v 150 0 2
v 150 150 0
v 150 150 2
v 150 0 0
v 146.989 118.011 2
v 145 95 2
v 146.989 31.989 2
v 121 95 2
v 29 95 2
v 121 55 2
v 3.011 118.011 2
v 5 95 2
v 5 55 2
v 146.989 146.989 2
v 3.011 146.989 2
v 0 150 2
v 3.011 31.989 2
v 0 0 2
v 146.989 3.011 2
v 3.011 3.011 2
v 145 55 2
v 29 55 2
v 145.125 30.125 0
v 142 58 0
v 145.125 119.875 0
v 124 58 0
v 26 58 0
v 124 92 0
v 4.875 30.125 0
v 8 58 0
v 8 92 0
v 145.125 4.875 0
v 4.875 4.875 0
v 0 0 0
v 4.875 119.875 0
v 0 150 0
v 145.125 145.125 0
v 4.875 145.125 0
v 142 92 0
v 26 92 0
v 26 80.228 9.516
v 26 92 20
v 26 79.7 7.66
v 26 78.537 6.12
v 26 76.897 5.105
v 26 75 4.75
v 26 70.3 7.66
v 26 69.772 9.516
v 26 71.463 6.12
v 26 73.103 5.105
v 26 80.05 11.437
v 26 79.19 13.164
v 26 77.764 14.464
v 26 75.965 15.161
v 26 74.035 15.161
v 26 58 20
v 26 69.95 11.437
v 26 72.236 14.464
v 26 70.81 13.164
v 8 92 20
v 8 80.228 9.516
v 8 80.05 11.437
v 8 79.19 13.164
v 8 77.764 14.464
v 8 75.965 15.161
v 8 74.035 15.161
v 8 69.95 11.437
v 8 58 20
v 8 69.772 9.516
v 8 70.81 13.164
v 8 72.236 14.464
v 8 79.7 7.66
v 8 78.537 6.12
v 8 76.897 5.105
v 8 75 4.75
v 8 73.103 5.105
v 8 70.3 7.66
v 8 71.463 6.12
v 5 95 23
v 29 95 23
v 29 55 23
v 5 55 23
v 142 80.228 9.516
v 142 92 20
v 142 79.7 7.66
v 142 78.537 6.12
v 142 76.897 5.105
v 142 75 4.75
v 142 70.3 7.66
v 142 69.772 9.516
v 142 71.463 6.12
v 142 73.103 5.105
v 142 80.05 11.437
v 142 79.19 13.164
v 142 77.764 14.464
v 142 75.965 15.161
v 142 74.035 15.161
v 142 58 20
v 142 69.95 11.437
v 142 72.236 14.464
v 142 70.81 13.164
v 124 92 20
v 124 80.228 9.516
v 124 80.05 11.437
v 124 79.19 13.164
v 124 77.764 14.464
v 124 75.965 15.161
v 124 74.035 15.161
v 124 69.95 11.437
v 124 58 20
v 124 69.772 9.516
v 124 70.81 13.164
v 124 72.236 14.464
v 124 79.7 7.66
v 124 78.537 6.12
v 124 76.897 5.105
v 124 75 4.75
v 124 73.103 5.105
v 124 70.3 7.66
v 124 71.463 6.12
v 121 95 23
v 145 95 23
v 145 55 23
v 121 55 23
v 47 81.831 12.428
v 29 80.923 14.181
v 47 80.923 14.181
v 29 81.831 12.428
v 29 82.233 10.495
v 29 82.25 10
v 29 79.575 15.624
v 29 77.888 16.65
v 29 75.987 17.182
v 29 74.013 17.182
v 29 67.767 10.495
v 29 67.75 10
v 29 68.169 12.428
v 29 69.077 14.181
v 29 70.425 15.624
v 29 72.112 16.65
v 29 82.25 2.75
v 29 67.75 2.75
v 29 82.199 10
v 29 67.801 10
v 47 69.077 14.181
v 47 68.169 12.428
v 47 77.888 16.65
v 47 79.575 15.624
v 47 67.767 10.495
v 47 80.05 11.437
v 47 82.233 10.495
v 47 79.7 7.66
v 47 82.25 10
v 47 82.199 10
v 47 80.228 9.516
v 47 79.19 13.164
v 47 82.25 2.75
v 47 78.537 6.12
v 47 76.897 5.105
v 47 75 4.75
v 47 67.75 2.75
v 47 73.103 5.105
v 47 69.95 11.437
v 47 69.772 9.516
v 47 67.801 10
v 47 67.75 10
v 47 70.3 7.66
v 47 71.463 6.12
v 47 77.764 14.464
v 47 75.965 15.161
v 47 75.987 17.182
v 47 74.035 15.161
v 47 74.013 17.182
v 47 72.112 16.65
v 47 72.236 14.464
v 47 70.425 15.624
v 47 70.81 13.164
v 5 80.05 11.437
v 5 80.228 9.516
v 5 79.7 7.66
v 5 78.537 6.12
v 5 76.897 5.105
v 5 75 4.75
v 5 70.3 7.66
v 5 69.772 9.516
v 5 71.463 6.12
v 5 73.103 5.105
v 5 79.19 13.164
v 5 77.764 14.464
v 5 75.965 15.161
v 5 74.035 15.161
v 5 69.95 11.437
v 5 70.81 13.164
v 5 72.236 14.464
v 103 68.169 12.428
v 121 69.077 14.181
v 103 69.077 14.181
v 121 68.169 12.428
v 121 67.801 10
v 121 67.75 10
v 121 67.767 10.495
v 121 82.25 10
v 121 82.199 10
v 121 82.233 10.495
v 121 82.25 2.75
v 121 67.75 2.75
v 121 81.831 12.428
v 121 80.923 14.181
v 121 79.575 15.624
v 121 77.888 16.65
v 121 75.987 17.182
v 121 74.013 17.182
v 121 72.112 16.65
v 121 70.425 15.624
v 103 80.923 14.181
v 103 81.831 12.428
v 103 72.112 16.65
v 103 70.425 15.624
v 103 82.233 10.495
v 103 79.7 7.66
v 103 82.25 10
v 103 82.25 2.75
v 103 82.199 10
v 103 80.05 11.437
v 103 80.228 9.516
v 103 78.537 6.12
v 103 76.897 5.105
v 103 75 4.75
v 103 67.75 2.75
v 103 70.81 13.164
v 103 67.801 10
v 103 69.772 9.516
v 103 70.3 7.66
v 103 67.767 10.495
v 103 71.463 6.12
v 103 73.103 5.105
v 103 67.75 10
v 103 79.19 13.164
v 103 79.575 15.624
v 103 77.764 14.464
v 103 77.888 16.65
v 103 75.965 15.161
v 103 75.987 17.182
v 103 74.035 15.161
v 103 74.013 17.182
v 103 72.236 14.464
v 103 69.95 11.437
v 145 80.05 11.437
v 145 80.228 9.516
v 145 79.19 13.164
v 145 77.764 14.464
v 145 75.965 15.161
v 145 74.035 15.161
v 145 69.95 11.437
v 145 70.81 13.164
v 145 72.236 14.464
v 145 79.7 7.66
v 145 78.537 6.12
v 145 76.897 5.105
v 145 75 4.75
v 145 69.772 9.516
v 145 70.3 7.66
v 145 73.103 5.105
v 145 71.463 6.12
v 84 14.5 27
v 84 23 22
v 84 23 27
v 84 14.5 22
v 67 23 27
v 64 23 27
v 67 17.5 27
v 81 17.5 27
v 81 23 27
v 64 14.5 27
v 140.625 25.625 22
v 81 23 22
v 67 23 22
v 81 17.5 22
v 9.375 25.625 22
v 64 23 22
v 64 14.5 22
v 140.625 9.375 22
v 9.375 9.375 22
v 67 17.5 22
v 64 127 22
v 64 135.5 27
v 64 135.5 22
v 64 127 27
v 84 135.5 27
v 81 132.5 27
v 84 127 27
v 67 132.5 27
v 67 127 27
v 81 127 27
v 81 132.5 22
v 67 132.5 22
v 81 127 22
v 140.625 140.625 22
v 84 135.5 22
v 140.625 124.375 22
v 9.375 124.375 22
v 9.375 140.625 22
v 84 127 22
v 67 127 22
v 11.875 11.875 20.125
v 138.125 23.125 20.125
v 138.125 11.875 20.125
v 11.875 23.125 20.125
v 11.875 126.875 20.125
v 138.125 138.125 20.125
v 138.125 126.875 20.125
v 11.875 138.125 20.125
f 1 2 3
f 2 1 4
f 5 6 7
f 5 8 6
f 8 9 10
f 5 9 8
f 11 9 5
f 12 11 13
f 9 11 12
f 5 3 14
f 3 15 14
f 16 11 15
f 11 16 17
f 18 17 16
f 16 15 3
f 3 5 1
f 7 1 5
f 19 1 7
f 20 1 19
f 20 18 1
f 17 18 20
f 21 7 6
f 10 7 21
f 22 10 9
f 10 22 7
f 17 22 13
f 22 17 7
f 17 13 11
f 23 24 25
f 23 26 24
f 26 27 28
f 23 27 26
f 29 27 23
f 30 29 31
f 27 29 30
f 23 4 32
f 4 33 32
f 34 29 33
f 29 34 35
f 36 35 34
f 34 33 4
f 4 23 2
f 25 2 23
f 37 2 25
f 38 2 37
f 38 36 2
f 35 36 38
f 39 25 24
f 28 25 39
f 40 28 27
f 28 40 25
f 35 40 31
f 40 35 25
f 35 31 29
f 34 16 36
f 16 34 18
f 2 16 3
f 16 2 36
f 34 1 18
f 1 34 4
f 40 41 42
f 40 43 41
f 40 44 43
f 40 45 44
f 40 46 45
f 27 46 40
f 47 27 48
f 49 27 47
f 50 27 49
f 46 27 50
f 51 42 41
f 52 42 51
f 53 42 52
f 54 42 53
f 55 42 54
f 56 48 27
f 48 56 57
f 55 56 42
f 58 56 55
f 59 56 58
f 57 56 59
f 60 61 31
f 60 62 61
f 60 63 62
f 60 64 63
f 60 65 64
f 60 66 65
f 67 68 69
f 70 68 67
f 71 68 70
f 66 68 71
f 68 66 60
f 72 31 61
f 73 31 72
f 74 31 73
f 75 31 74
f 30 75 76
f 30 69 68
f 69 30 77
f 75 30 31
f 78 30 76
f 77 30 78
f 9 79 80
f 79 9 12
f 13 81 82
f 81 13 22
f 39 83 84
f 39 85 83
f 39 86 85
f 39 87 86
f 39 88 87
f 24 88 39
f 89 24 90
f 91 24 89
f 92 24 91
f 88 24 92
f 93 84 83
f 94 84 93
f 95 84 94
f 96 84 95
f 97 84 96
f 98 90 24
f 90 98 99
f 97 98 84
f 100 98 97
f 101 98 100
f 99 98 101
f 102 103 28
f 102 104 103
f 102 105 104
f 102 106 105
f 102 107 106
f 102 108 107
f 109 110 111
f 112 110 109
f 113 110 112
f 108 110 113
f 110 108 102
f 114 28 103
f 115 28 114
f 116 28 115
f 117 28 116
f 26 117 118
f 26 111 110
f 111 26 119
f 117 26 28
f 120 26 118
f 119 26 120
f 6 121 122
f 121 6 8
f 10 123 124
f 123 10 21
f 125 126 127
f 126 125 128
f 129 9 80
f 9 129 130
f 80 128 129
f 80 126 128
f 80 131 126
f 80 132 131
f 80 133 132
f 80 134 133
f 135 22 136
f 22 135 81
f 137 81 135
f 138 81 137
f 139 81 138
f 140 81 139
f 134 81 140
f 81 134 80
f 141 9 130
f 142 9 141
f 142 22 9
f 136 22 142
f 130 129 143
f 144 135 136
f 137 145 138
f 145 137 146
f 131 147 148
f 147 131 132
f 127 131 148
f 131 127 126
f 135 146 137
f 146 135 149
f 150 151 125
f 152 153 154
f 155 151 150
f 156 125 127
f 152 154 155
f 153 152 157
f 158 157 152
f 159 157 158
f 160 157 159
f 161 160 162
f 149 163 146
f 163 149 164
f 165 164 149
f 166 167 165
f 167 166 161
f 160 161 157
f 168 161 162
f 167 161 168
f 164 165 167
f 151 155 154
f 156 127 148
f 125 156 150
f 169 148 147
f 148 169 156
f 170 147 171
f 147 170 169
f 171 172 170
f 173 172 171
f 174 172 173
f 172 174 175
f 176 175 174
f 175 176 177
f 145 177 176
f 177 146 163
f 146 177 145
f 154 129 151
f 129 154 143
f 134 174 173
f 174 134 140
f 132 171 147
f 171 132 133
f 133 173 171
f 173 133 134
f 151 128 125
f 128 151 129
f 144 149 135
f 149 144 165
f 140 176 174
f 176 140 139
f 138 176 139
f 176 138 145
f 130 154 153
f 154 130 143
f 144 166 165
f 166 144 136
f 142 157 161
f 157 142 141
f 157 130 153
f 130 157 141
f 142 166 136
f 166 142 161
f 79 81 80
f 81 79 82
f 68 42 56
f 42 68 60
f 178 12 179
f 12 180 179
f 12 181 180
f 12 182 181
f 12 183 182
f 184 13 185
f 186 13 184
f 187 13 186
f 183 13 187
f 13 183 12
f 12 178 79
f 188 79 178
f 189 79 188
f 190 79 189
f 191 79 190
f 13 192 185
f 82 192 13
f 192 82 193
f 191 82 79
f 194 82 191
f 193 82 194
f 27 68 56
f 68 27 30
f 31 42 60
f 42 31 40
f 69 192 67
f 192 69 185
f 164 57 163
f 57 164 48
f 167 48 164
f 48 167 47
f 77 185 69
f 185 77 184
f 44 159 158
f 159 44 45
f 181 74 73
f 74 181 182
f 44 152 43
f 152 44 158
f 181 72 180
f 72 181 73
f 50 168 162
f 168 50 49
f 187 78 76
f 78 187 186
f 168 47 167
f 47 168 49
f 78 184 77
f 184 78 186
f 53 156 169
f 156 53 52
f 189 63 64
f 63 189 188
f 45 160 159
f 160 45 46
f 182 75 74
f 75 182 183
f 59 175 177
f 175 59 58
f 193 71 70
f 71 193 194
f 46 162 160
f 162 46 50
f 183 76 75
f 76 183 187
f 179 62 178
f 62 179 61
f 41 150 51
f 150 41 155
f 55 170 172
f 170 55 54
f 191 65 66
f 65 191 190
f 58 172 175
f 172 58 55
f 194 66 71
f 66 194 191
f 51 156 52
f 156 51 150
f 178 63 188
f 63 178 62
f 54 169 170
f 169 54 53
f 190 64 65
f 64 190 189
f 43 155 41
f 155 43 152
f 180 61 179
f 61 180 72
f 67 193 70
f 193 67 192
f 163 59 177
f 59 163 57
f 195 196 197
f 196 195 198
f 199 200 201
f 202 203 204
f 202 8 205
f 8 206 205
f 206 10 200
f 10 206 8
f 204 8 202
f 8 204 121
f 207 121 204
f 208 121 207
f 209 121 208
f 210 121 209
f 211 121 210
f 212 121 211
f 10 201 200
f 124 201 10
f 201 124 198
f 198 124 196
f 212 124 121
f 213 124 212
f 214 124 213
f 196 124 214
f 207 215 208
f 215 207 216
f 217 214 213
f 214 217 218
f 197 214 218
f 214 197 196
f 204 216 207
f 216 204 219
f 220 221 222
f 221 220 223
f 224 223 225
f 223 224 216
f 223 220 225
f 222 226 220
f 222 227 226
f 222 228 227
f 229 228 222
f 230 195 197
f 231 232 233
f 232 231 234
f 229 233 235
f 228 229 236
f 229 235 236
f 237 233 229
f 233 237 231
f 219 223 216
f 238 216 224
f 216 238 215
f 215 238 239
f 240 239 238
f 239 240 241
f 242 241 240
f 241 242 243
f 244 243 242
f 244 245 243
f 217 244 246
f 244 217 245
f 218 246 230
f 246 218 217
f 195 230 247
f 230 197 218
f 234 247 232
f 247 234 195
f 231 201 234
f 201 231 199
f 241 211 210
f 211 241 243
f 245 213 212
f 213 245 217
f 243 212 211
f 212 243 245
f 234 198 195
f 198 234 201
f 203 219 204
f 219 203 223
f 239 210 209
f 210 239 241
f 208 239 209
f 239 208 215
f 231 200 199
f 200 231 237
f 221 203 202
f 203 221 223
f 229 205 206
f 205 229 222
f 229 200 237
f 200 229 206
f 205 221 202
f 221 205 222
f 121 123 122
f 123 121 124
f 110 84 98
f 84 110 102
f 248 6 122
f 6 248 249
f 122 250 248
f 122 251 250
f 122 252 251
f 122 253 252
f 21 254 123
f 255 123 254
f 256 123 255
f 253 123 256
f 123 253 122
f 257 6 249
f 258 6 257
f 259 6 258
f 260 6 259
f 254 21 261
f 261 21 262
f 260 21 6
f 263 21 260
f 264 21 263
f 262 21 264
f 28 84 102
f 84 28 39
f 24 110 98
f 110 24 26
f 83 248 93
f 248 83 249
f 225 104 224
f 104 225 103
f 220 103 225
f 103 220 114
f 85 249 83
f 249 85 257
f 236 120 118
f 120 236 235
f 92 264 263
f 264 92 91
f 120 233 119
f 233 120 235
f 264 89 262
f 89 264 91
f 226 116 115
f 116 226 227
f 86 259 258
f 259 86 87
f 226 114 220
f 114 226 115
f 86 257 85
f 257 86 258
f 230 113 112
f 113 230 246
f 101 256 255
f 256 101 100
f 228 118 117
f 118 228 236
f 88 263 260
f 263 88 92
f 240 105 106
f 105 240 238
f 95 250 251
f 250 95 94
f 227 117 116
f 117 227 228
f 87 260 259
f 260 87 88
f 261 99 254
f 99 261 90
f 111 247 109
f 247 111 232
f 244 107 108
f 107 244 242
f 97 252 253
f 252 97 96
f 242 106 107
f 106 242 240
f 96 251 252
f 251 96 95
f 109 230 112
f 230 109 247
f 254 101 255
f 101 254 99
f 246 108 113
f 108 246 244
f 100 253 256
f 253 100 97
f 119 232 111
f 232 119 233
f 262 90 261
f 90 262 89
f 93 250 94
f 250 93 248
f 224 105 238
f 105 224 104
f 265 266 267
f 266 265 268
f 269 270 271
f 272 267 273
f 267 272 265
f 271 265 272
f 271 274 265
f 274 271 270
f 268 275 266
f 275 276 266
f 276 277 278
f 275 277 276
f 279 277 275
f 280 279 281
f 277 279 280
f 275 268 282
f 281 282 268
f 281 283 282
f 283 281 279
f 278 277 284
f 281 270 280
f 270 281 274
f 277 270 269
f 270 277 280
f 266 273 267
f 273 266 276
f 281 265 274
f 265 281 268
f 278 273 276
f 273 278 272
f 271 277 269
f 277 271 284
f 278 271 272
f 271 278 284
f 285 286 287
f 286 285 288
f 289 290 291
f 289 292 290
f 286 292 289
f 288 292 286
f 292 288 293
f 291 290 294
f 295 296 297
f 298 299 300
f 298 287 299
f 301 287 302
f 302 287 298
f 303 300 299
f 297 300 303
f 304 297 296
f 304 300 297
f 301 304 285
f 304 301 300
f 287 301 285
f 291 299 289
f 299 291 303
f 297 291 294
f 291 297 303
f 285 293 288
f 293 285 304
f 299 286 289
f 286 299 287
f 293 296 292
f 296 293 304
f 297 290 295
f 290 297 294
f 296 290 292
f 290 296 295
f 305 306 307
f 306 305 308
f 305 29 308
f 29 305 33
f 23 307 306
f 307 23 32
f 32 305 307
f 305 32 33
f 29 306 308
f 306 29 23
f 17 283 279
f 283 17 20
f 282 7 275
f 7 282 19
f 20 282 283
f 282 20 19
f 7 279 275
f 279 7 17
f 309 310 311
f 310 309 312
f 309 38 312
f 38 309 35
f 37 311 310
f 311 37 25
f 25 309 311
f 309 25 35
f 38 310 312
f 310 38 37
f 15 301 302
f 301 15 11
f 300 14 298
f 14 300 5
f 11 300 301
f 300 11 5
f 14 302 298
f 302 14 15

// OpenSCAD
// file: dimensions.scad
//------------------------------------------------------------------------------
// Cargo holder - dimensions
//
// This file contains the dimensions for the cargo holder mechanism.
//
// This model is part of the AutonomousDroneDeliverySystem:
// https://github.com/Andreas-Menzel/AutonomousDroneDeliverySystem
//------------------------------------------------------------------------------
// @author: Andreas Menzel
// @copyright: Copyright (c) 2022 Andreas Menzel
//------------------------------------------------------------------------------

// Notes:
// - width, length and height are always in relation to the drone, unless
//   explicitly stated otherwise

//////////////////////////////// Contact Plate /////////////////////////////////
// The contact plates of the container- and drone- part touch. They have the
// same size. TODO: Use magnets to help with the alignment of the parts?
contact_plate_width = 150;
contact_plate_length = 150;
contact_plate_wall_thickness = 2;

//////////////////////////////// Alignment Pin /////////////////////////////////
// Pins used to align the cargo container relative to the drone. This mechanism
// can (only) correct small misalignments.

// Offset from the contact plate sides
alignment_pin_offset = 5;
// Clearance (on all sides) to allow for slightly misaligned drone / cargo
// container
alignment_pin_align_clearance = 7;

alignment_pin_width_base = contact_plate_width - 2*alignment_pin_offset;
alignment_pin_length_base = 25;

alignment_pin_width_top = alignment_pin_width_base - 2*alignment_pin_align_clearance;
alignment_pin_length_top = alignment_pin_length_base - 2*alignment_pin_align_clearance;

alignment_pin_height = 20;

alignment_pin_slot_wall_thickness = 2;
// The wall thickness of the alignment pin slot measured in XY-plane. The
// The wall thickness is slightly smaller. TODO: calculate correctly.
alignment_pin_slot_plane_wall_thickness = 2.5;

// Half of the clearance will be added to each part (container / drone)
alignment_pin_clearance = 0.25;

////////////////////////////// Locking Mechanism ///////////////////////////////
locking_mechanism_pin_wire_diamter = 1;
locking_mechanism_pin_wire_connection_outline = 2;
locking_mechanism_pin_diameter = 10;
locking_mechanism_pin_clearance_lock = 0.5;
locking_mechanism_pin_clearance_key = 2;

locking_mechanism_lock_key_clearance = 2*alignment_pin_align_clearance;

// The key part is located on the container
locking_mechanism_key_thickness = 4;
locking_mechanism_key_pin_outline = 4; // Wall thickness around the hole of the
                                       // locking pin.

// The lock part is located on the drone
locking_mechanism_lock_offset = alignment_pin_offset;
locking_mechanism_lock_wall_thickness = 3;
locking_mechanism_lock_rest_length = locking_mechanism_lock_key_clearance + locking_mechanism_key_thickness;
locking_mechanism_lock_rest_wall_thickness = 2;

///////////////////////////////// Servo Mount //////////////////////////////////
servo_slot_wall_thickness = 2;
servo_slot_height = 10;

servo_mount_width = 5;
servo_mount_thickness = 7;
servo_mount_screw_slot_width = 0.75;

servo_assembly_thickness = 5;

// The width OF THE SERVO - smaller side of the servo; not in relation to the
// drone
servo_body_width = 12;
// The length OF THE SERVO - larger side of the servo; not in relation to the
// drone
servo_body_length = 23;
servo_center_offset = 6;
servo_height_offset = 11;

// Wall thickness of the slot on the drone part in which the servo mount will be
// glued to.
servo_mount_drone_part_wall_thickness = 3;
// main file
//------------------------------------------------------------------------------
// Cargo holder - drone part
//
// This model contains all parts of the cargo holder mechanism mounted directly
// to the drone.
//
// This model is part of the AutonomousDroneDeliverySystem:
// https://github.com/Andreas-Menzel/AutonomousDroneDeliverySystem
//------------------------------------------------------------------------------
// @author: Andreas Menzel
// @copyright: Copyright (c) 2022 Andreas Menzel
//------------------------------------------------------------------------------


include <dimensions.scad>


module _drone_part__locking_mechanism_lock() {
    // Short versions of the variables needed
    wall_thickness = locking_mechanism_lock_wall_thickness;
    pin_diameter = locking_mechanism_pin_diameter;
    pin_clearance = locking_mechanism_pin_clearance_lock;
    pin_clearance_key = locking_mechanism_pin_clearance_key;

    rest_length = locking_mechanism_lock_rest_length;
    rest_wall_thickness = locking_mechanism_lock_rest_wall_thickness;

    lock_key_clearance = locking_mechanism_lock_key_clearance;
    key_thickness = locking_mechanism_key_thickness;

    key_pin_outline = locking_mechanism_key_pin_outline;

    width_without_rest = wall_thickness + wall_thickness + key_thickness + lock_key_clearance;
    length = pin_diameter + pin_clearance_key + lock_key_clearance + 2*wall_thickness + 2*key_pin_outline;
    height = pin_diameter + pin_clearance_key + wall_thickness + 2*key_pin_outline;

    // Lock
    difference() {
        union() {
            // Top
            translate([0, 0, height - wall_thickness])
                cube([width_without_rest,
                      length, wall_thickness]);
            // Left
            cube([wall_thickness, length, height]);
            // Right
            translate([wall_thickness + key_thickness + lock_key_clearance, 0, 0])
                cube([wall_thickness, length, height]);
            
            // Front
            cube([2*wall_thickness + key_thickness + lock_key_clearance,
                  wall_thickness, height]);
            // Back
            translate([0, length - wall_thickness, 0])
                cube([2*wall_thickness + key_thickness + lock_key_clearance,
                      wall_thickness, height]);
            
            // Wall - rest
            translate([2*wall_thickness + key_thickness + lock_key_clearance,
                       length / 2,
                       (height - wall_thickness) / 2]) {
                rotate([0, 90, 0])
                    cylinder(d=pin_diameter + pin_clearance + 2*rest_wall_thickness,
                            h=rest_length);
                
                translate([0,
                           -((pin_diameter + pin_clearance + 2*rest_wall_thickness) / 2),
                           -((pin_diameter + pin_clearance + 2*rest_wall_thickness) / 2)])
                    cube([rest_length,
                          pin_diameter + pin_clearance + 2*rest_wall_thickness,
                          (pin_diameter + pin_clearance + 2*rest_wall_thickness) / 2]);
            }
        }

        // Hole for the pin
        translate([0, length / 2, (height - wall_thickness) / 2])
            rotate([0, 90, 0])
            cylinder(d=pin_diameter + pin_clearance,
                     h=2*wall_thickness + key_thickness + lock_key_clearance + rest_length);
    }
}


module _drone_part__locking_mechanism() {
    // Short versions of the variables needed
    pin_diameter = locking_mechanism_pin_diameter;
    pin_clearance_key = locking_mechanism_pin_clearance_key;
    lock_key_clearance = locking_mechanism_lock_key_clearance;
    wall_thickness_lock = locking_mechanism_lock_wall_thickness;
    key_pin_outline = locking_mechanism_key_pin_outline;
    key_thickness = locking_mechanism_key_thickness;
    lock_offset = locking_mechanism_lock_offset;

    width_without_rest = 2*wall_thickness_lock + key_thickness + lock_key_clearance;
    length = pin_diameter + pin_clearance_key + lock_key_clearance + 2*wall_thickness_lock + 2*key_pin_outline;

    lock_distance_from_center = contact_plate_width / 2 - width_without_rest - lock_offset;

    translate([-(width_without_rest + lock_distance_from_center), 0, 0])
        _drone_part__locking_mechanism_lock();

    translate([width_without_rest + lock_distance_from_center, length, 0])
        rotate([0, 0, 180])
        _drone_part__locking_mechanism_lock();
}


module _drone_part__alignment_pin_slot() {
    // Short versions of the variables needed
    width_base = alignment_pin_width_base;
    length_base = alignment_pin_length_base;
    width_top = alignment_pin_width_top;
    length_top = alignment_pin_length_top;
    height = alignment_pin_height;
    clearance = alignment_pin_clearance / 2;

    plane_wall_thickness = alignment_pin_slot_plane_wall_thickness;
    wall_thickness = alignment_pin_slot_wall_thickness;

    top_width_offset = (width_base - width_top) / 2;
    top_length_offset = (length_base - length_top) / 2;

    points = [
        // base - inner
        [-clearance, -clearance, 0],
        [width_base + clearance, -clearance, 0],
        [width_base + clearance, length_base + clearance, 0],
        [-clearance, length_base + clearance, 0],

        // base - outer
        [-clearance - plane_wall_thickness, -clearance - plane_wall_thickness, 0],
        [width_base + clearance + plane_wall_thickness, -clearance - plane_wall_thickness, 0],
        [width_base + clearance + plane_wall_thickness, length_base + clearance + plane_wall_thickness, 0],
        [-clearance  -plane_wall_thickness, length_base + clearance + plane_wall_thickness, 0],

        // top - inner
        // TODO: With this solution, the angles of the walls are slightly
        //       changed. This is no problem at all, but not very "beautiful",
        //       because I know that it isn't perfect.
        [top_width_offset - clearance, top_length_offset - clearance, height + clearance],
        [top_width_offset + width_top + clearance, top_length_offset - clearance, height + clearance],
        [top_width_offset + width_top + clearance, top_length_offset + length_top + clearance, height + clearance],
        [top_width_offset - clearance, top_length_offset + length_top + clearance, height + clearance],

        // top - outer
        // TODO: With this solution, the angles of the walls are slightly
        //       changed. This is no problem at all, but not very "beautiful",
        //       because I know that it isn't perfect.
        [top_width_offset - clearance - plane_wall_thickness, top_length_offset - clearance - plane_wall_thickness, height + wall_thickness],
        [top_width_offset + width_top + clearance + plane_wall_thickness, top_length_offset - clearance - plane_wall_thickness, height + wall_thickness],
        [top_width_offset + width_top + clearance + plane_wall_thickness, top_length_offset + length_top + clearance + plane_wall_thickness, height + wall_thickness],
        [top_width_offset - clearance - plane_wall_thickness, top_length_offset + length_top + clearance + plane_wall_thickness, height + wall_thickness]
    ];
    
    faces = [
        [8, 9, 10, 11],   // top - inner

        [0, 8, 11, 3],    // left - inner
        [1, 2, 10, 9],    // right - inner

        [9, 8, 0, 1],     // front - inner
        [2, 3, 11, 10],   // back - inner

        [15, 14, 13, 12], // top - outer

        [7, 15, 12, 4],   // left - outer
        [13, 14, 6, 5],   // right - outer

        [5, 4, 12, 13],   // front - outer
        [14, 15, 7, 6],   // back - outer

        [0, 4, 5, 1],     // bottom - front
        [3, 2, 6, 7],     // bottom - back
        [0, 3, 7, 4],     // bottom - left
        [1, 5, 6, 2],     // bottom - right
    ];

    polyhedron(points, faces);
}


module _drone_part__contact_plate() {
    // Short versions of the variables needed
    width = contact_plate_width;
    length = contact_plate_length;
    wall_thickness = contact_plate_wall_thickness;

    pin_diameter = locking_mechanism_pin_diameter;
    pin_clearance_key = locking_mechanism_pin_clearance_key;
    lock_key_clearance = locking_mechanism_lock_key_clearance;
    wall_thickness_lock = locking_mechanism_lock_wall_thickness;
    key_pin_outline = locking_mechanism_key_pin_outline;
    key_thickness = locking_mechanism_key_thickness;

    align_width_total = alignment_pin_width_base + 2*alignment_pin_slot_plane_wall_thickness;
    align_length_total = alignment_pin_length_base + 2*alignment_pin_slot_plane_wall_thickness;

    lock_length = pin_diameter + pin_clearance_key + lock_key_clearance + 2*wall_thickness_lock + 2*key_pin_outline;

    difference() {
        cube([width, length, wall_thickness]);

        //cutout: lock - left
        translate([locking_mechanism_lock_offset + wall_thickness_lock,
                   contact_plate_length / 2 - lock_length / 2,
                   0])
            cube([lock_key_clearance + key_thickness, lock_length, wall_thickness]);

        //cutout: lock - right
        translate([contact_plate_width - (lock_key_clearance + key_thickness) - (locking_mechanism_lock_offset + wall_thickness_lock),
                   contact_plate_length / 2 - lock_length / 2,
                   0])
            cube([lock_key_clearance + key_thickness, lock_length, wall_thickness]);
        
        // cutout: alignment pin slot - front
        translate([alignment_pin_offset - 0.5*alignment_pin_clearance, alignment_pin_offset - 0.5*alignment_pin_clearance, 0])
            cube([alignment_pin_width_base + alignment_pin_clearance, alignment_pin_length_base + alignment_pin_clearance, wall_thickness]);
        
        // cutout: alignment pin slot - back
        translate([alignment_pin_offset - 0.5*alignment_pin_clearance, length - (alignment_pin_length_base + alignment_pin_clearance) - alignment_pin_offset + 0.5*alignment_pin_clearance, 0])
            cube([alignment_pin_width_base + alignment_pin_clearance, alignment_pin_length_base + alignment_pin_clearance, wall_thickness]);
    }
}


module drone_part__servo_mount_slot() {
    // Short versions of the variables needed
    slot_wall_thickness = servo_mount_drone_part_wall_thickness;

    slot_width = servo_body_width + servo_slot_wall_thickness;
    slot_length = alignment_pin_length_top / 2;
    slot_height = servo_assembly_thickness;

    difference() {
        translate([-slot_wall_thickness, -slot_wall_thickness, 0])
            cube([slot_width + 2*slot_wall_thickness,
                  slot_length + slot_wall_thickness,
                  slot_height]);
        
        cube([slot_width, slot_length, slot_height]);
    }
}

drone_part();
module drone_part() {
    // Short versions of the variables needed
    lm_pin_diameter = locking_mechanism_pin_diameter;
    lm_pin_clearance_key = locking_mechanism_pin_clearance_key;
    lm_lock_key_clearance = locking_mechanism_lock_key_clearance;
    lm_wall_thickness_lock = locking_mechanism_lock_wall_thickness;
    lm_key_pin_outline = locking_mechanism_key_pin_outline;

    lm_length = lm_pin_diameter + lm_pin_clearance_key + lm_lock_key_clearance + 2*lm_wall_thickness_lock + 2*lm_key_pin_outline;

    cp_width = contact_plate_width;

    union() {
        _drone_part__contact_plate();

        translate([alignment_pin_offset, alignment_pin_offset, 0])
            _drone_part__alignment_pin_slot();
        translate([alignment_pin_offset, contact_plate_length - alignment_pin_length_base - alignment_pin_offset, 0])
            _drone_part__alignment_pin_slot();
        
        translate([contact_plate_width / 2, (contact_plate_length / 2) - (lm_length / 2), 0])
            _drone_part__locking_mechanism();
        
        translate([(cp_width / 2) - (servo_body_width / 2) - servo_slot_wall_thickness,
                    0,
                    alignment_pin_height + alignment_pin_slot_wall_thickness]) {
            
            translate([0,
                       alignment_pin_offset + ((alignment_pin_length_base - alignment_pin_length_top) / 2) + (alignment_pin_length_top / 2),
                       0])
                drone_part__servo_mount_slot();
            
            translate([0,
                       cp_width - (alignment_pin_offset + ((alignment_pin_length_base - alignment_pin_length_top) / 2) + (alignment_pin_length_top / 2)),
                       0])
                translate([servo_body_width + servo_slot_wall_thickness, 0, 0])
                rotate([0, 0, 180])
                drone_part__servo_mount_slot();
        }
    }
}


// When executing the `export.sh` script, this variable will autimatically be
// set to true. The default value should be false.
export = false;
if(export) {
    drone_part();
}
